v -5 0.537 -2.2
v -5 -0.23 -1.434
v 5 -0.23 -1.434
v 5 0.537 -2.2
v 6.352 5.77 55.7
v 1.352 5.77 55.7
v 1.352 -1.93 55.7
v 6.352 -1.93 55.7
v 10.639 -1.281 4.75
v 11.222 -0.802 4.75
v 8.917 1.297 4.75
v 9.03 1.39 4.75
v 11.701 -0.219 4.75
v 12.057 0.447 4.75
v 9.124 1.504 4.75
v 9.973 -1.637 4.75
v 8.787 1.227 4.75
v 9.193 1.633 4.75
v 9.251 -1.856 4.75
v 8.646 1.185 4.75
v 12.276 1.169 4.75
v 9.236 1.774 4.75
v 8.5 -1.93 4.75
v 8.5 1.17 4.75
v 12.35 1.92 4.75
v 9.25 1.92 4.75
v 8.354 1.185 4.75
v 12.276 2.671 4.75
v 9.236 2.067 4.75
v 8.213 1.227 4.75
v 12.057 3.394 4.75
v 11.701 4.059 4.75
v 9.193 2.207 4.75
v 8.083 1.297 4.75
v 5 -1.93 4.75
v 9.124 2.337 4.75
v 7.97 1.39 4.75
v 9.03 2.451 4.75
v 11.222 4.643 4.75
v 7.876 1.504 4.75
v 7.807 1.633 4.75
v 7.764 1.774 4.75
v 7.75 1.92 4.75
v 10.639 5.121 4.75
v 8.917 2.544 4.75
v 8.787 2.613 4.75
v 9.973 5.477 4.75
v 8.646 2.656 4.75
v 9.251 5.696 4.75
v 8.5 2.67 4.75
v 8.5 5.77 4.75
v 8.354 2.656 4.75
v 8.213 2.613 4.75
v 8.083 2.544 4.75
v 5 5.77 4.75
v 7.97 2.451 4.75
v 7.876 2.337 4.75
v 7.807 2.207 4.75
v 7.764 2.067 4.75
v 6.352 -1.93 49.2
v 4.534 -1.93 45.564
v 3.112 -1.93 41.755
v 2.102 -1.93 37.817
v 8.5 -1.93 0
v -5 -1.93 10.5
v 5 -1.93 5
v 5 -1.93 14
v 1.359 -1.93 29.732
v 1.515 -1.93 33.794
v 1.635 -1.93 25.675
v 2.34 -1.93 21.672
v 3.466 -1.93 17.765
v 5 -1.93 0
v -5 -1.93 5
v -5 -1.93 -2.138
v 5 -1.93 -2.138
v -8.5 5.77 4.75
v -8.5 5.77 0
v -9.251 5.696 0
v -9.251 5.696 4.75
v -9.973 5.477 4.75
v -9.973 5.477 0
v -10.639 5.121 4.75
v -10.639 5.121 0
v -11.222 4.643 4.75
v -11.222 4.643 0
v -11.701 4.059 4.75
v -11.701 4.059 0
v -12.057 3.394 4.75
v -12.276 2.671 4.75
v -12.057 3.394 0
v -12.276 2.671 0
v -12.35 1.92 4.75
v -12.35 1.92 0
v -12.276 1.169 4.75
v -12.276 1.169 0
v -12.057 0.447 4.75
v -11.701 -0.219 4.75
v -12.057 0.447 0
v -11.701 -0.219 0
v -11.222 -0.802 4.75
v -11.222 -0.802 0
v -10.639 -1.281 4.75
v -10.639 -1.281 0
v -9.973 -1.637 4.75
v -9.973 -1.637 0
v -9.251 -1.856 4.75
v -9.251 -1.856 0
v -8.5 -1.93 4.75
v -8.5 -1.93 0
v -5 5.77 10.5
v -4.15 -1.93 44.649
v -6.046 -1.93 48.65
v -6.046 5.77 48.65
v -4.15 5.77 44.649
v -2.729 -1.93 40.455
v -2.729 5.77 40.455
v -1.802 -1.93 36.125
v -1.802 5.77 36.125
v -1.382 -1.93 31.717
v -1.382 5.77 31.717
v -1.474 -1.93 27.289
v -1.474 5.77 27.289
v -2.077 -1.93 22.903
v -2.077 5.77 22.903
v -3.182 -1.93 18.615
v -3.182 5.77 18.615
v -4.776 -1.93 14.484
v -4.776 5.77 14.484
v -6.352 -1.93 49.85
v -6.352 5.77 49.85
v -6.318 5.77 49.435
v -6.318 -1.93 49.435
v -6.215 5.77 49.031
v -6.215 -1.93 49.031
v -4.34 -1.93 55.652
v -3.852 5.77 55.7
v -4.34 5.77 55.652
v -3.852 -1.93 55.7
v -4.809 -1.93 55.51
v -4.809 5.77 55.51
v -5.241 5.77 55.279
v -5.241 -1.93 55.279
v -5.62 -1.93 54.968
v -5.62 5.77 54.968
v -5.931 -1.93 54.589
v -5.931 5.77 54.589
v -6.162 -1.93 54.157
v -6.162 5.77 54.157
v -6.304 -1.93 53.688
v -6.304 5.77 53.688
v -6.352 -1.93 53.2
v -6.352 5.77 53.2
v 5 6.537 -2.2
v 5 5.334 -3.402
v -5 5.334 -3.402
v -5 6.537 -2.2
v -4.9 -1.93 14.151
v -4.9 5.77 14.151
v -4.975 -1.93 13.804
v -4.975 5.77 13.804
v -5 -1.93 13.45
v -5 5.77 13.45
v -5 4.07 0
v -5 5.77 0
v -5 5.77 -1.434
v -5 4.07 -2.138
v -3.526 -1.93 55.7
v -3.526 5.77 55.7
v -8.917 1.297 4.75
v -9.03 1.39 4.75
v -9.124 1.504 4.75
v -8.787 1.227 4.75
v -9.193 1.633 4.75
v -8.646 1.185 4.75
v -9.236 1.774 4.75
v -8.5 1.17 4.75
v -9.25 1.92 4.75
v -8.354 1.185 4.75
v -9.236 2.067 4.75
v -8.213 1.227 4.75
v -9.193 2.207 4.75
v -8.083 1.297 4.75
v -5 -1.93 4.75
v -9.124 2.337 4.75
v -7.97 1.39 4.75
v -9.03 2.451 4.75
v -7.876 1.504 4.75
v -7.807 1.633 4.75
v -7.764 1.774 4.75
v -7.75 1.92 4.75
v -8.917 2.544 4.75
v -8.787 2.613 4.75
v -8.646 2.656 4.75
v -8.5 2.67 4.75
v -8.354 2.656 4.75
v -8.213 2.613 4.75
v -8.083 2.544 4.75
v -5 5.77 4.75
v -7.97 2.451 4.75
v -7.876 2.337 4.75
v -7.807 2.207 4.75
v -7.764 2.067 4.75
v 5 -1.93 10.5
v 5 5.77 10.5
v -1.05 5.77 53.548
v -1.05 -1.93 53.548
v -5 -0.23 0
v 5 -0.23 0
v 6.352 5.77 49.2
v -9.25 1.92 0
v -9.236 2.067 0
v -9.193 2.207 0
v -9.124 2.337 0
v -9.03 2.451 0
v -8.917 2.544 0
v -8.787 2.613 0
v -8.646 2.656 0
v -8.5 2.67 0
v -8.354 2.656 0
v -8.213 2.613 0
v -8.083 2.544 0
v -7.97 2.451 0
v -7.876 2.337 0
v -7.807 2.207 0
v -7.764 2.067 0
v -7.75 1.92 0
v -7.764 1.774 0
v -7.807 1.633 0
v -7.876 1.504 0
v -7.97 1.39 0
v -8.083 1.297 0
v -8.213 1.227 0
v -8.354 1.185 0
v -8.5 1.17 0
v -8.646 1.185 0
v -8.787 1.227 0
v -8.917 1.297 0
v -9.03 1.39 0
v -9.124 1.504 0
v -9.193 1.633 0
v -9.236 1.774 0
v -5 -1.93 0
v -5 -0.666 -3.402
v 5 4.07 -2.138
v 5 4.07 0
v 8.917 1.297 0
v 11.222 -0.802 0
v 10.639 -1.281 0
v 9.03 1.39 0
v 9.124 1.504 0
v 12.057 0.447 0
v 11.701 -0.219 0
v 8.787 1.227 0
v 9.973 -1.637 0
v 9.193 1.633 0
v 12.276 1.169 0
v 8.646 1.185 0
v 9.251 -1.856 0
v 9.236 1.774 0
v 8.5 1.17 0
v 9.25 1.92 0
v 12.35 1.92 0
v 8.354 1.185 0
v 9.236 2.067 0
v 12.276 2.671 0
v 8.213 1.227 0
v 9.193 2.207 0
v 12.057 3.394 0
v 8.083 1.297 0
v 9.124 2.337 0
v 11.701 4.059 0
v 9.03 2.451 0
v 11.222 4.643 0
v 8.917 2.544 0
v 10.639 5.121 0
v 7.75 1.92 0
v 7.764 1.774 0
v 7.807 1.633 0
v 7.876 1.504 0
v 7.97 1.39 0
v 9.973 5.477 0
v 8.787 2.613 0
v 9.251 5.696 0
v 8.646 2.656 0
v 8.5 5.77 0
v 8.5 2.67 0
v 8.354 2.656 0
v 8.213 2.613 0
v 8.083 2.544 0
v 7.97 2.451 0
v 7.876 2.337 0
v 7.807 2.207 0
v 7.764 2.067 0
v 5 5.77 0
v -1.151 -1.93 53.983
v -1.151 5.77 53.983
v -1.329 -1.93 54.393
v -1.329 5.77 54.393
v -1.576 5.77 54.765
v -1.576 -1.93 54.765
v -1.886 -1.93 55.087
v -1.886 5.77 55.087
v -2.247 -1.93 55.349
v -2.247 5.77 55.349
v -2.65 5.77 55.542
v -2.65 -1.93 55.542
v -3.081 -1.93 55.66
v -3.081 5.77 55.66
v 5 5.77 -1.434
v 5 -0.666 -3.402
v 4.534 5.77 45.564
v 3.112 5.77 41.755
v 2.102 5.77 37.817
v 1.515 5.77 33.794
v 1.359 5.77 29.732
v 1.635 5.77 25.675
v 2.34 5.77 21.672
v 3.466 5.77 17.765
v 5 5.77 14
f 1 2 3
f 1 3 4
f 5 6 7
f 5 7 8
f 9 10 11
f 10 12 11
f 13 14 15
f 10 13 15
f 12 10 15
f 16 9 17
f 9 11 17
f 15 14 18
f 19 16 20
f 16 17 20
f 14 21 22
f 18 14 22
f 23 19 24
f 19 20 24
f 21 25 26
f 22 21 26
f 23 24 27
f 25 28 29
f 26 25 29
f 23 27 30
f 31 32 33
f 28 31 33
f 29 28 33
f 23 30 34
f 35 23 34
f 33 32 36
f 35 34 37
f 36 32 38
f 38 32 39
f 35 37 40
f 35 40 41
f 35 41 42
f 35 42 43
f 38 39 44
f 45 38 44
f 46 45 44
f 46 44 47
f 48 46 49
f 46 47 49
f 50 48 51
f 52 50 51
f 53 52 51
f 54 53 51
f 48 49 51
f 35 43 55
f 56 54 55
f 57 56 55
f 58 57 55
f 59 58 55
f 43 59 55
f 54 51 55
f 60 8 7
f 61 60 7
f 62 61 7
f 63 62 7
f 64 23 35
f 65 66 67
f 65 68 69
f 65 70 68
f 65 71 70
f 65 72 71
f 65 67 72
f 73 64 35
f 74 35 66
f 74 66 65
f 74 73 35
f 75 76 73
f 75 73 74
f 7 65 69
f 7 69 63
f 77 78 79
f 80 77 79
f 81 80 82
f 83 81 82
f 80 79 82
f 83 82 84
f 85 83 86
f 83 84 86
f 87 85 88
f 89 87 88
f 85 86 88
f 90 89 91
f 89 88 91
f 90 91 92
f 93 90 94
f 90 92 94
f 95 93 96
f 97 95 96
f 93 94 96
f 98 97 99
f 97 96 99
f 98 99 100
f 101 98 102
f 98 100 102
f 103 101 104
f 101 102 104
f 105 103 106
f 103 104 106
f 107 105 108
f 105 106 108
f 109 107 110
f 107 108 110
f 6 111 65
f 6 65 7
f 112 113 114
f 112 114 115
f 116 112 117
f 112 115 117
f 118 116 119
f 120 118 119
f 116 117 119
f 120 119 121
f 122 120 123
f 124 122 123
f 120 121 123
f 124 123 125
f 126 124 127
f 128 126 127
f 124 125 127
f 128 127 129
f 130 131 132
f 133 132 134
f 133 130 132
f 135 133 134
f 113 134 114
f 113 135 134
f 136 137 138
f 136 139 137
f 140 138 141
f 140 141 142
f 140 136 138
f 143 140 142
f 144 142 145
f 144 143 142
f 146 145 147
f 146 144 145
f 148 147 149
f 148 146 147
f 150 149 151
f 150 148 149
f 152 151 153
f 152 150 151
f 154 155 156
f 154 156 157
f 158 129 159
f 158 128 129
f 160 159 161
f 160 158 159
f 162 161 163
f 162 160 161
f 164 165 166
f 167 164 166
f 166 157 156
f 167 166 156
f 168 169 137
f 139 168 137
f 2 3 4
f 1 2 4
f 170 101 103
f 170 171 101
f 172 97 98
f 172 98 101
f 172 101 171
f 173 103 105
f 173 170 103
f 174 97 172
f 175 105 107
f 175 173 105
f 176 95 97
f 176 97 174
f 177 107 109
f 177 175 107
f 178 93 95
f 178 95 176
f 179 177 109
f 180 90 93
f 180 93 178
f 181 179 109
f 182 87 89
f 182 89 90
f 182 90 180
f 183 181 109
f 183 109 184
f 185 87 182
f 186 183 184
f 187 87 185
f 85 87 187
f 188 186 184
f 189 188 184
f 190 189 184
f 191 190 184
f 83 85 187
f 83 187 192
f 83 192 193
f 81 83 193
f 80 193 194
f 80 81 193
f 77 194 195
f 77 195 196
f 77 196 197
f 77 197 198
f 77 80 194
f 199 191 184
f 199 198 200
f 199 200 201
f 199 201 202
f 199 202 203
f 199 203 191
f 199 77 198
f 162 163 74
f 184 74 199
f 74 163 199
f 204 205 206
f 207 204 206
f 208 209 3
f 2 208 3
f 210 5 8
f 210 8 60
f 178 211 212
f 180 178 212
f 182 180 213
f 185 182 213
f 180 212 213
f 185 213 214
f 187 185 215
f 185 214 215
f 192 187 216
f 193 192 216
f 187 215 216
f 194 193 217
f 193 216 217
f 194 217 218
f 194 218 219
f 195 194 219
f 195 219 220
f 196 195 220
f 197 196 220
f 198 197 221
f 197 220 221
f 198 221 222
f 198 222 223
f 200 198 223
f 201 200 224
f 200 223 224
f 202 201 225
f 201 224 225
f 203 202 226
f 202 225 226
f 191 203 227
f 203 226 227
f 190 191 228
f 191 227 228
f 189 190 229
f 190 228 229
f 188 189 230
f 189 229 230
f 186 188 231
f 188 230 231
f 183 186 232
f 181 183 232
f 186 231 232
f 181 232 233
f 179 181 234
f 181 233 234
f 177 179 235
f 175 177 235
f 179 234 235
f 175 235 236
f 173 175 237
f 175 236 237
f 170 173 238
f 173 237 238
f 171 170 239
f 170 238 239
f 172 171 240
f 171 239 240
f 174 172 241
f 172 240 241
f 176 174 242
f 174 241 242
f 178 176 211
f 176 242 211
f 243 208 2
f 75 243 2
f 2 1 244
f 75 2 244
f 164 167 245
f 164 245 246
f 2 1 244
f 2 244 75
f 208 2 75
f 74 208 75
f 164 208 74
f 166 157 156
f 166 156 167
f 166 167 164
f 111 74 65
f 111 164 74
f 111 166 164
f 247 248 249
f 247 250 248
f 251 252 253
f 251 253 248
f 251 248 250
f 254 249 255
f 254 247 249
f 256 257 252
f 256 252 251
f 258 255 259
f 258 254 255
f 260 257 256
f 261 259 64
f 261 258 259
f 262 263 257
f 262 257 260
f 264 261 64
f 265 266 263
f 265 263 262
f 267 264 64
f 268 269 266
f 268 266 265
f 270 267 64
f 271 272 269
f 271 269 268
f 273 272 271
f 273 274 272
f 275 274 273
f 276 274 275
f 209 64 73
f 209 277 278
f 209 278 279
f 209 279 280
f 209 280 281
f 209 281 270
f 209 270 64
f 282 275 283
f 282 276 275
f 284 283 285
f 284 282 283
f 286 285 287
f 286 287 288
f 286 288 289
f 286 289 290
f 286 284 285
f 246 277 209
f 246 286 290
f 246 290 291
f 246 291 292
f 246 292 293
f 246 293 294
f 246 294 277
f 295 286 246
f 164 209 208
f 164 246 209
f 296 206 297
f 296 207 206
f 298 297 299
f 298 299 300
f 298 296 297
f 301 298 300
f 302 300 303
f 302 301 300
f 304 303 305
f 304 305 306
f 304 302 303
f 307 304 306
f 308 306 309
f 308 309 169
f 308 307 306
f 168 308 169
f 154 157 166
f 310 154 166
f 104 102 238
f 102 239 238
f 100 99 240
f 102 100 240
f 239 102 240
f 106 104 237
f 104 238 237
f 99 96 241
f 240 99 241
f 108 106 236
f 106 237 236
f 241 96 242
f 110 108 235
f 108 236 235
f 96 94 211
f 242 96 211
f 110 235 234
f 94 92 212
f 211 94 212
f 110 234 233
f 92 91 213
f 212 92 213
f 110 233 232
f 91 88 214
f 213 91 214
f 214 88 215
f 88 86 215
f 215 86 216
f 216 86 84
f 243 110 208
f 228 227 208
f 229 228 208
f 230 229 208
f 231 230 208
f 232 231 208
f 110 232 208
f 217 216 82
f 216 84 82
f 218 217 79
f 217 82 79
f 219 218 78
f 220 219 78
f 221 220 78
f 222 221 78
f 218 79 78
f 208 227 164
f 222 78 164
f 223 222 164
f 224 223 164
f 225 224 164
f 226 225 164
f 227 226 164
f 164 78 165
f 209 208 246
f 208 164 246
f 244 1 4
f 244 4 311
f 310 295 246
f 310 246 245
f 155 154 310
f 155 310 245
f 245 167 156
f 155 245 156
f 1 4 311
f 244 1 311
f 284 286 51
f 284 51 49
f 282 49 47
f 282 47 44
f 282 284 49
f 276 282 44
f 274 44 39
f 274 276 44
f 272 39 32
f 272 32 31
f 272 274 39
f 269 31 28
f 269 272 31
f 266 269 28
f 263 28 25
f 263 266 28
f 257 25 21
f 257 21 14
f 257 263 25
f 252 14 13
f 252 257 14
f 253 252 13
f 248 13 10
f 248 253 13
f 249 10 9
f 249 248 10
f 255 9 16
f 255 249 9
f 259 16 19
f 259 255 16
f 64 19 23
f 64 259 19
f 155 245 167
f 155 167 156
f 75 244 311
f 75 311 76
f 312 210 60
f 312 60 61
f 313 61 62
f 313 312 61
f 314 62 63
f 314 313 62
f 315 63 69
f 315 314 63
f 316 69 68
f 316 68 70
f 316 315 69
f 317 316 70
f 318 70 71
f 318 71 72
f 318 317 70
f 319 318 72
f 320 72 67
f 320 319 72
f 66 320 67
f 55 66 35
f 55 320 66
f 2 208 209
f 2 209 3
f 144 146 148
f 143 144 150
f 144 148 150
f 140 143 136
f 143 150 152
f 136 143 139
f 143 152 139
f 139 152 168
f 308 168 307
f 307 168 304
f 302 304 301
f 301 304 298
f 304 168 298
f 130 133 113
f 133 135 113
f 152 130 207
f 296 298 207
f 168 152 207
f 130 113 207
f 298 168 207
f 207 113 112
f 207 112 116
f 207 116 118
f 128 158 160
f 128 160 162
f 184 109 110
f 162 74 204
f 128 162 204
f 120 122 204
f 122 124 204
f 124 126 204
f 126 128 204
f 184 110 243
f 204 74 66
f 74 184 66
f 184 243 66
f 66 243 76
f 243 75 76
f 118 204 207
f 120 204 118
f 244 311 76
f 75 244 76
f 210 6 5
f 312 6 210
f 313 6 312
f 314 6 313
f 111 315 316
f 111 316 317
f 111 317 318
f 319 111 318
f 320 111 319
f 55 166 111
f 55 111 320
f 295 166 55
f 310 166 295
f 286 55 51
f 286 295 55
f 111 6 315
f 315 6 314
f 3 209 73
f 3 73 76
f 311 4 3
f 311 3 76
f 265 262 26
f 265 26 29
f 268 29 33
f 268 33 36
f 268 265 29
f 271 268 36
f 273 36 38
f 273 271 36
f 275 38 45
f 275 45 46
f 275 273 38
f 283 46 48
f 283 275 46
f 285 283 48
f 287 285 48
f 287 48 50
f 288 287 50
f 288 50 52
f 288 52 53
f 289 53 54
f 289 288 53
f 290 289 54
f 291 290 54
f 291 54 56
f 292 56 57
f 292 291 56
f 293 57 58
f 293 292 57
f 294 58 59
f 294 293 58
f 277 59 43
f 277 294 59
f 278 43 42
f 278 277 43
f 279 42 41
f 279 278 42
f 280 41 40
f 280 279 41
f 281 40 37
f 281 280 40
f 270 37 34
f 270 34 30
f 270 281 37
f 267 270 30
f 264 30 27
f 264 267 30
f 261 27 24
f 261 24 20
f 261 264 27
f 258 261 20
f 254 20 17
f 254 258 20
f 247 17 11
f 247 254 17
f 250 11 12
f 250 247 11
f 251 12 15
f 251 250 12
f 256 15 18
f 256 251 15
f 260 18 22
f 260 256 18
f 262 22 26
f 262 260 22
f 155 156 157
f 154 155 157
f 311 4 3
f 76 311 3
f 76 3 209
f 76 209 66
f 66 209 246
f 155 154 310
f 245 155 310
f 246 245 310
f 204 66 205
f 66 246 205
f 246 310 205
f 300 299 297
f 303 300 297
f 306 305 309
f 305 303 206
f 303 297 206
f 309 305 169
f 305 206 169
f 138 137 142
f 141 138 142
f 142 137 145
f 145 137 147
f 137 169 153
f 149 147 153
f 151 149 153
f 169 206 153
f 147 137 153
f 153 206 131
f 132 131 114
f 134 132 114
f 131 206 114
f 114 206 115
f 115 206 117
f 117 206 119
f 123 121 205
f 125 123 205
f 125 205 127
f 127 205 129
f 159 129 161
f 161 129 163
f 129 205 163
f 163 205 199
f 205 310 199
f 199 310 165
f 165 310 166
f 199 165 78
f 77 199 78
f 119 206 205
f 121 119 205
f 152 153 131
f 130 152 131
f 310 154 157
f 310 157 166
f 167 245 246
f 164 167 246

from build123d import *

# Parameters (mm, degrees)
SKETCH2_W           = 10
SKETCH2_H           = 14.768412439
BOSS_EXTRUDE1_DEPTH = 5
BOSS_EXTRUDE4_DEPTH = 10
SKETCH9_W           = 10
SKETCH9_H           = 3.18
SKETCH9_H_2         = 3.888412439
CUT_EXTRUDE3_DEPTH  = 5
BOSS_EXTRUDE5_DEPTH = 7.7
SKETCH12_R          = 0.75
BOSS_EXTRUDE7_DEPTH = 4.75
FILLET1_R           = 2.5


with BuildPart() as part:
    # Sketch2 → Boss-Extrude1 (new body)
    with BuildSketch(Plane.XY):
        with Locations((0, 1.566049366)):
            Rectangle(SKETCH2_W, SKETCH2_H)
    extrude(amount=BOSS_EXTRUDE1_DEPTH)

    # Sketch8 → Boss-Extrude4 (add)
    with BuildSketch(Plane.ZY.offset(5)):
        Polygon((-0.15, 5.770255585), (0, 5.770255585), (0, 4.070255585), (-0.15, 4.070255585), (-2.137867966, 4.070255585), (-3.402081528, 5.334469147), (-2.2, 6.536550675), (-1.43370491, 5.770255585), align=None)
        Polygon((-0.15, -1.929744415), (0, -1.929744415), (0, -0.229744415), (-0.15, -0.229744415), (-1.43370491, -0.229744415), (-2.2, 0.536550675), (-3.402081528, -0.665530853), (-2.137867966, -1.929744415), align=None)
    extrude(amount=-BOSS_EXTRUDE4_DEPTH)

    # Sketch9 → Cut-Extrude3 (cut)
    with BuildSketch(Plane(origin=(0, 0, 0), x_dir=(-1, 0, 0), z_dir=(0, 0, -1))):
        with Locations((0, 7.360255585)):
            Rectangle(SKETCH9_W, SKETCH9_H)
        with Locations((0, -3.873950635)):
            Rectangle(SKETCH9_W, SKETCH9_H_2)
    extrude(amount=-CUT_EXTRUDE3_DEPTH, mode=Mode.SUBTRACT)

    # Sketch10 → Boss-Extrude5 (add)
    with BuildSketch(Plane(origin=(0, 5.770255585, 0), x_dir=(1, 0, 0), z_dir=(0, 1, 0))):
        with BuildLine():
            Line((-5, -5), (-5, -10.5))
            Line((-5, -10.5), (1.352445729, -55.7))
            Line((1.352445729, -55.7), (6.352445729, -55.7))
            Line((6.352445729, -55.7), (6.352445729, -49.2))
            ThreePointArc((6.352445729, -49.2), (1.383429579, -31.764936646), (5, -14))
            Line((5, -14), (5, -5))
            Line((5, -5), (-5, -5))
        make_face()
    extrude(amount=-BOSS_EXTRUDE5_DEPTH)

    # Sketch12 → Boss-Extrude7 (add)
    with BuildSketch(Plane.XY):
        with BuildLine():
            Line((5, 5.770255585), (8.5, 5.770255585))
            ThreePointArc((8.5, 5.770255585), (12.35, 1.920255585), (8.5, -1.929744415))
            Line((8.5, -1.929744415), (5, -1.929744415))
            Line((5, -1.929744415), (5, 5.770255585))
        make_face()
        with Locations((8.5, 1.920255585)):
            Circle(SKETCH12_R, mode=Mode.SUBTRACT)
    extrude(amount=BOSS_EXTRUDE7_DEPTH)


with BuildPart() as body_2:
    # Mirror1: mirrored copy
    add(part.part.mirror(Plane(origin=(0, 0, 0), x_dir=(0, 0, 1), z_dir=(1, 0, 0))))

    # Fillet1
    fillet1_edges = [body_2.edges().sort_by_distance(p)[0] for p in [
        (-6.352445729, 1.920255585, 49.2),
        (-5, 1.920255585, 14),
        (-1.352445729, 1.920255585, 55.7),
        (-6.352445729, 1.920255585, 55.7),
    ]]
    fillet(fillet1_edges, radius=FILLET1_R)


solid = Compound([part.part, body_2.part])
